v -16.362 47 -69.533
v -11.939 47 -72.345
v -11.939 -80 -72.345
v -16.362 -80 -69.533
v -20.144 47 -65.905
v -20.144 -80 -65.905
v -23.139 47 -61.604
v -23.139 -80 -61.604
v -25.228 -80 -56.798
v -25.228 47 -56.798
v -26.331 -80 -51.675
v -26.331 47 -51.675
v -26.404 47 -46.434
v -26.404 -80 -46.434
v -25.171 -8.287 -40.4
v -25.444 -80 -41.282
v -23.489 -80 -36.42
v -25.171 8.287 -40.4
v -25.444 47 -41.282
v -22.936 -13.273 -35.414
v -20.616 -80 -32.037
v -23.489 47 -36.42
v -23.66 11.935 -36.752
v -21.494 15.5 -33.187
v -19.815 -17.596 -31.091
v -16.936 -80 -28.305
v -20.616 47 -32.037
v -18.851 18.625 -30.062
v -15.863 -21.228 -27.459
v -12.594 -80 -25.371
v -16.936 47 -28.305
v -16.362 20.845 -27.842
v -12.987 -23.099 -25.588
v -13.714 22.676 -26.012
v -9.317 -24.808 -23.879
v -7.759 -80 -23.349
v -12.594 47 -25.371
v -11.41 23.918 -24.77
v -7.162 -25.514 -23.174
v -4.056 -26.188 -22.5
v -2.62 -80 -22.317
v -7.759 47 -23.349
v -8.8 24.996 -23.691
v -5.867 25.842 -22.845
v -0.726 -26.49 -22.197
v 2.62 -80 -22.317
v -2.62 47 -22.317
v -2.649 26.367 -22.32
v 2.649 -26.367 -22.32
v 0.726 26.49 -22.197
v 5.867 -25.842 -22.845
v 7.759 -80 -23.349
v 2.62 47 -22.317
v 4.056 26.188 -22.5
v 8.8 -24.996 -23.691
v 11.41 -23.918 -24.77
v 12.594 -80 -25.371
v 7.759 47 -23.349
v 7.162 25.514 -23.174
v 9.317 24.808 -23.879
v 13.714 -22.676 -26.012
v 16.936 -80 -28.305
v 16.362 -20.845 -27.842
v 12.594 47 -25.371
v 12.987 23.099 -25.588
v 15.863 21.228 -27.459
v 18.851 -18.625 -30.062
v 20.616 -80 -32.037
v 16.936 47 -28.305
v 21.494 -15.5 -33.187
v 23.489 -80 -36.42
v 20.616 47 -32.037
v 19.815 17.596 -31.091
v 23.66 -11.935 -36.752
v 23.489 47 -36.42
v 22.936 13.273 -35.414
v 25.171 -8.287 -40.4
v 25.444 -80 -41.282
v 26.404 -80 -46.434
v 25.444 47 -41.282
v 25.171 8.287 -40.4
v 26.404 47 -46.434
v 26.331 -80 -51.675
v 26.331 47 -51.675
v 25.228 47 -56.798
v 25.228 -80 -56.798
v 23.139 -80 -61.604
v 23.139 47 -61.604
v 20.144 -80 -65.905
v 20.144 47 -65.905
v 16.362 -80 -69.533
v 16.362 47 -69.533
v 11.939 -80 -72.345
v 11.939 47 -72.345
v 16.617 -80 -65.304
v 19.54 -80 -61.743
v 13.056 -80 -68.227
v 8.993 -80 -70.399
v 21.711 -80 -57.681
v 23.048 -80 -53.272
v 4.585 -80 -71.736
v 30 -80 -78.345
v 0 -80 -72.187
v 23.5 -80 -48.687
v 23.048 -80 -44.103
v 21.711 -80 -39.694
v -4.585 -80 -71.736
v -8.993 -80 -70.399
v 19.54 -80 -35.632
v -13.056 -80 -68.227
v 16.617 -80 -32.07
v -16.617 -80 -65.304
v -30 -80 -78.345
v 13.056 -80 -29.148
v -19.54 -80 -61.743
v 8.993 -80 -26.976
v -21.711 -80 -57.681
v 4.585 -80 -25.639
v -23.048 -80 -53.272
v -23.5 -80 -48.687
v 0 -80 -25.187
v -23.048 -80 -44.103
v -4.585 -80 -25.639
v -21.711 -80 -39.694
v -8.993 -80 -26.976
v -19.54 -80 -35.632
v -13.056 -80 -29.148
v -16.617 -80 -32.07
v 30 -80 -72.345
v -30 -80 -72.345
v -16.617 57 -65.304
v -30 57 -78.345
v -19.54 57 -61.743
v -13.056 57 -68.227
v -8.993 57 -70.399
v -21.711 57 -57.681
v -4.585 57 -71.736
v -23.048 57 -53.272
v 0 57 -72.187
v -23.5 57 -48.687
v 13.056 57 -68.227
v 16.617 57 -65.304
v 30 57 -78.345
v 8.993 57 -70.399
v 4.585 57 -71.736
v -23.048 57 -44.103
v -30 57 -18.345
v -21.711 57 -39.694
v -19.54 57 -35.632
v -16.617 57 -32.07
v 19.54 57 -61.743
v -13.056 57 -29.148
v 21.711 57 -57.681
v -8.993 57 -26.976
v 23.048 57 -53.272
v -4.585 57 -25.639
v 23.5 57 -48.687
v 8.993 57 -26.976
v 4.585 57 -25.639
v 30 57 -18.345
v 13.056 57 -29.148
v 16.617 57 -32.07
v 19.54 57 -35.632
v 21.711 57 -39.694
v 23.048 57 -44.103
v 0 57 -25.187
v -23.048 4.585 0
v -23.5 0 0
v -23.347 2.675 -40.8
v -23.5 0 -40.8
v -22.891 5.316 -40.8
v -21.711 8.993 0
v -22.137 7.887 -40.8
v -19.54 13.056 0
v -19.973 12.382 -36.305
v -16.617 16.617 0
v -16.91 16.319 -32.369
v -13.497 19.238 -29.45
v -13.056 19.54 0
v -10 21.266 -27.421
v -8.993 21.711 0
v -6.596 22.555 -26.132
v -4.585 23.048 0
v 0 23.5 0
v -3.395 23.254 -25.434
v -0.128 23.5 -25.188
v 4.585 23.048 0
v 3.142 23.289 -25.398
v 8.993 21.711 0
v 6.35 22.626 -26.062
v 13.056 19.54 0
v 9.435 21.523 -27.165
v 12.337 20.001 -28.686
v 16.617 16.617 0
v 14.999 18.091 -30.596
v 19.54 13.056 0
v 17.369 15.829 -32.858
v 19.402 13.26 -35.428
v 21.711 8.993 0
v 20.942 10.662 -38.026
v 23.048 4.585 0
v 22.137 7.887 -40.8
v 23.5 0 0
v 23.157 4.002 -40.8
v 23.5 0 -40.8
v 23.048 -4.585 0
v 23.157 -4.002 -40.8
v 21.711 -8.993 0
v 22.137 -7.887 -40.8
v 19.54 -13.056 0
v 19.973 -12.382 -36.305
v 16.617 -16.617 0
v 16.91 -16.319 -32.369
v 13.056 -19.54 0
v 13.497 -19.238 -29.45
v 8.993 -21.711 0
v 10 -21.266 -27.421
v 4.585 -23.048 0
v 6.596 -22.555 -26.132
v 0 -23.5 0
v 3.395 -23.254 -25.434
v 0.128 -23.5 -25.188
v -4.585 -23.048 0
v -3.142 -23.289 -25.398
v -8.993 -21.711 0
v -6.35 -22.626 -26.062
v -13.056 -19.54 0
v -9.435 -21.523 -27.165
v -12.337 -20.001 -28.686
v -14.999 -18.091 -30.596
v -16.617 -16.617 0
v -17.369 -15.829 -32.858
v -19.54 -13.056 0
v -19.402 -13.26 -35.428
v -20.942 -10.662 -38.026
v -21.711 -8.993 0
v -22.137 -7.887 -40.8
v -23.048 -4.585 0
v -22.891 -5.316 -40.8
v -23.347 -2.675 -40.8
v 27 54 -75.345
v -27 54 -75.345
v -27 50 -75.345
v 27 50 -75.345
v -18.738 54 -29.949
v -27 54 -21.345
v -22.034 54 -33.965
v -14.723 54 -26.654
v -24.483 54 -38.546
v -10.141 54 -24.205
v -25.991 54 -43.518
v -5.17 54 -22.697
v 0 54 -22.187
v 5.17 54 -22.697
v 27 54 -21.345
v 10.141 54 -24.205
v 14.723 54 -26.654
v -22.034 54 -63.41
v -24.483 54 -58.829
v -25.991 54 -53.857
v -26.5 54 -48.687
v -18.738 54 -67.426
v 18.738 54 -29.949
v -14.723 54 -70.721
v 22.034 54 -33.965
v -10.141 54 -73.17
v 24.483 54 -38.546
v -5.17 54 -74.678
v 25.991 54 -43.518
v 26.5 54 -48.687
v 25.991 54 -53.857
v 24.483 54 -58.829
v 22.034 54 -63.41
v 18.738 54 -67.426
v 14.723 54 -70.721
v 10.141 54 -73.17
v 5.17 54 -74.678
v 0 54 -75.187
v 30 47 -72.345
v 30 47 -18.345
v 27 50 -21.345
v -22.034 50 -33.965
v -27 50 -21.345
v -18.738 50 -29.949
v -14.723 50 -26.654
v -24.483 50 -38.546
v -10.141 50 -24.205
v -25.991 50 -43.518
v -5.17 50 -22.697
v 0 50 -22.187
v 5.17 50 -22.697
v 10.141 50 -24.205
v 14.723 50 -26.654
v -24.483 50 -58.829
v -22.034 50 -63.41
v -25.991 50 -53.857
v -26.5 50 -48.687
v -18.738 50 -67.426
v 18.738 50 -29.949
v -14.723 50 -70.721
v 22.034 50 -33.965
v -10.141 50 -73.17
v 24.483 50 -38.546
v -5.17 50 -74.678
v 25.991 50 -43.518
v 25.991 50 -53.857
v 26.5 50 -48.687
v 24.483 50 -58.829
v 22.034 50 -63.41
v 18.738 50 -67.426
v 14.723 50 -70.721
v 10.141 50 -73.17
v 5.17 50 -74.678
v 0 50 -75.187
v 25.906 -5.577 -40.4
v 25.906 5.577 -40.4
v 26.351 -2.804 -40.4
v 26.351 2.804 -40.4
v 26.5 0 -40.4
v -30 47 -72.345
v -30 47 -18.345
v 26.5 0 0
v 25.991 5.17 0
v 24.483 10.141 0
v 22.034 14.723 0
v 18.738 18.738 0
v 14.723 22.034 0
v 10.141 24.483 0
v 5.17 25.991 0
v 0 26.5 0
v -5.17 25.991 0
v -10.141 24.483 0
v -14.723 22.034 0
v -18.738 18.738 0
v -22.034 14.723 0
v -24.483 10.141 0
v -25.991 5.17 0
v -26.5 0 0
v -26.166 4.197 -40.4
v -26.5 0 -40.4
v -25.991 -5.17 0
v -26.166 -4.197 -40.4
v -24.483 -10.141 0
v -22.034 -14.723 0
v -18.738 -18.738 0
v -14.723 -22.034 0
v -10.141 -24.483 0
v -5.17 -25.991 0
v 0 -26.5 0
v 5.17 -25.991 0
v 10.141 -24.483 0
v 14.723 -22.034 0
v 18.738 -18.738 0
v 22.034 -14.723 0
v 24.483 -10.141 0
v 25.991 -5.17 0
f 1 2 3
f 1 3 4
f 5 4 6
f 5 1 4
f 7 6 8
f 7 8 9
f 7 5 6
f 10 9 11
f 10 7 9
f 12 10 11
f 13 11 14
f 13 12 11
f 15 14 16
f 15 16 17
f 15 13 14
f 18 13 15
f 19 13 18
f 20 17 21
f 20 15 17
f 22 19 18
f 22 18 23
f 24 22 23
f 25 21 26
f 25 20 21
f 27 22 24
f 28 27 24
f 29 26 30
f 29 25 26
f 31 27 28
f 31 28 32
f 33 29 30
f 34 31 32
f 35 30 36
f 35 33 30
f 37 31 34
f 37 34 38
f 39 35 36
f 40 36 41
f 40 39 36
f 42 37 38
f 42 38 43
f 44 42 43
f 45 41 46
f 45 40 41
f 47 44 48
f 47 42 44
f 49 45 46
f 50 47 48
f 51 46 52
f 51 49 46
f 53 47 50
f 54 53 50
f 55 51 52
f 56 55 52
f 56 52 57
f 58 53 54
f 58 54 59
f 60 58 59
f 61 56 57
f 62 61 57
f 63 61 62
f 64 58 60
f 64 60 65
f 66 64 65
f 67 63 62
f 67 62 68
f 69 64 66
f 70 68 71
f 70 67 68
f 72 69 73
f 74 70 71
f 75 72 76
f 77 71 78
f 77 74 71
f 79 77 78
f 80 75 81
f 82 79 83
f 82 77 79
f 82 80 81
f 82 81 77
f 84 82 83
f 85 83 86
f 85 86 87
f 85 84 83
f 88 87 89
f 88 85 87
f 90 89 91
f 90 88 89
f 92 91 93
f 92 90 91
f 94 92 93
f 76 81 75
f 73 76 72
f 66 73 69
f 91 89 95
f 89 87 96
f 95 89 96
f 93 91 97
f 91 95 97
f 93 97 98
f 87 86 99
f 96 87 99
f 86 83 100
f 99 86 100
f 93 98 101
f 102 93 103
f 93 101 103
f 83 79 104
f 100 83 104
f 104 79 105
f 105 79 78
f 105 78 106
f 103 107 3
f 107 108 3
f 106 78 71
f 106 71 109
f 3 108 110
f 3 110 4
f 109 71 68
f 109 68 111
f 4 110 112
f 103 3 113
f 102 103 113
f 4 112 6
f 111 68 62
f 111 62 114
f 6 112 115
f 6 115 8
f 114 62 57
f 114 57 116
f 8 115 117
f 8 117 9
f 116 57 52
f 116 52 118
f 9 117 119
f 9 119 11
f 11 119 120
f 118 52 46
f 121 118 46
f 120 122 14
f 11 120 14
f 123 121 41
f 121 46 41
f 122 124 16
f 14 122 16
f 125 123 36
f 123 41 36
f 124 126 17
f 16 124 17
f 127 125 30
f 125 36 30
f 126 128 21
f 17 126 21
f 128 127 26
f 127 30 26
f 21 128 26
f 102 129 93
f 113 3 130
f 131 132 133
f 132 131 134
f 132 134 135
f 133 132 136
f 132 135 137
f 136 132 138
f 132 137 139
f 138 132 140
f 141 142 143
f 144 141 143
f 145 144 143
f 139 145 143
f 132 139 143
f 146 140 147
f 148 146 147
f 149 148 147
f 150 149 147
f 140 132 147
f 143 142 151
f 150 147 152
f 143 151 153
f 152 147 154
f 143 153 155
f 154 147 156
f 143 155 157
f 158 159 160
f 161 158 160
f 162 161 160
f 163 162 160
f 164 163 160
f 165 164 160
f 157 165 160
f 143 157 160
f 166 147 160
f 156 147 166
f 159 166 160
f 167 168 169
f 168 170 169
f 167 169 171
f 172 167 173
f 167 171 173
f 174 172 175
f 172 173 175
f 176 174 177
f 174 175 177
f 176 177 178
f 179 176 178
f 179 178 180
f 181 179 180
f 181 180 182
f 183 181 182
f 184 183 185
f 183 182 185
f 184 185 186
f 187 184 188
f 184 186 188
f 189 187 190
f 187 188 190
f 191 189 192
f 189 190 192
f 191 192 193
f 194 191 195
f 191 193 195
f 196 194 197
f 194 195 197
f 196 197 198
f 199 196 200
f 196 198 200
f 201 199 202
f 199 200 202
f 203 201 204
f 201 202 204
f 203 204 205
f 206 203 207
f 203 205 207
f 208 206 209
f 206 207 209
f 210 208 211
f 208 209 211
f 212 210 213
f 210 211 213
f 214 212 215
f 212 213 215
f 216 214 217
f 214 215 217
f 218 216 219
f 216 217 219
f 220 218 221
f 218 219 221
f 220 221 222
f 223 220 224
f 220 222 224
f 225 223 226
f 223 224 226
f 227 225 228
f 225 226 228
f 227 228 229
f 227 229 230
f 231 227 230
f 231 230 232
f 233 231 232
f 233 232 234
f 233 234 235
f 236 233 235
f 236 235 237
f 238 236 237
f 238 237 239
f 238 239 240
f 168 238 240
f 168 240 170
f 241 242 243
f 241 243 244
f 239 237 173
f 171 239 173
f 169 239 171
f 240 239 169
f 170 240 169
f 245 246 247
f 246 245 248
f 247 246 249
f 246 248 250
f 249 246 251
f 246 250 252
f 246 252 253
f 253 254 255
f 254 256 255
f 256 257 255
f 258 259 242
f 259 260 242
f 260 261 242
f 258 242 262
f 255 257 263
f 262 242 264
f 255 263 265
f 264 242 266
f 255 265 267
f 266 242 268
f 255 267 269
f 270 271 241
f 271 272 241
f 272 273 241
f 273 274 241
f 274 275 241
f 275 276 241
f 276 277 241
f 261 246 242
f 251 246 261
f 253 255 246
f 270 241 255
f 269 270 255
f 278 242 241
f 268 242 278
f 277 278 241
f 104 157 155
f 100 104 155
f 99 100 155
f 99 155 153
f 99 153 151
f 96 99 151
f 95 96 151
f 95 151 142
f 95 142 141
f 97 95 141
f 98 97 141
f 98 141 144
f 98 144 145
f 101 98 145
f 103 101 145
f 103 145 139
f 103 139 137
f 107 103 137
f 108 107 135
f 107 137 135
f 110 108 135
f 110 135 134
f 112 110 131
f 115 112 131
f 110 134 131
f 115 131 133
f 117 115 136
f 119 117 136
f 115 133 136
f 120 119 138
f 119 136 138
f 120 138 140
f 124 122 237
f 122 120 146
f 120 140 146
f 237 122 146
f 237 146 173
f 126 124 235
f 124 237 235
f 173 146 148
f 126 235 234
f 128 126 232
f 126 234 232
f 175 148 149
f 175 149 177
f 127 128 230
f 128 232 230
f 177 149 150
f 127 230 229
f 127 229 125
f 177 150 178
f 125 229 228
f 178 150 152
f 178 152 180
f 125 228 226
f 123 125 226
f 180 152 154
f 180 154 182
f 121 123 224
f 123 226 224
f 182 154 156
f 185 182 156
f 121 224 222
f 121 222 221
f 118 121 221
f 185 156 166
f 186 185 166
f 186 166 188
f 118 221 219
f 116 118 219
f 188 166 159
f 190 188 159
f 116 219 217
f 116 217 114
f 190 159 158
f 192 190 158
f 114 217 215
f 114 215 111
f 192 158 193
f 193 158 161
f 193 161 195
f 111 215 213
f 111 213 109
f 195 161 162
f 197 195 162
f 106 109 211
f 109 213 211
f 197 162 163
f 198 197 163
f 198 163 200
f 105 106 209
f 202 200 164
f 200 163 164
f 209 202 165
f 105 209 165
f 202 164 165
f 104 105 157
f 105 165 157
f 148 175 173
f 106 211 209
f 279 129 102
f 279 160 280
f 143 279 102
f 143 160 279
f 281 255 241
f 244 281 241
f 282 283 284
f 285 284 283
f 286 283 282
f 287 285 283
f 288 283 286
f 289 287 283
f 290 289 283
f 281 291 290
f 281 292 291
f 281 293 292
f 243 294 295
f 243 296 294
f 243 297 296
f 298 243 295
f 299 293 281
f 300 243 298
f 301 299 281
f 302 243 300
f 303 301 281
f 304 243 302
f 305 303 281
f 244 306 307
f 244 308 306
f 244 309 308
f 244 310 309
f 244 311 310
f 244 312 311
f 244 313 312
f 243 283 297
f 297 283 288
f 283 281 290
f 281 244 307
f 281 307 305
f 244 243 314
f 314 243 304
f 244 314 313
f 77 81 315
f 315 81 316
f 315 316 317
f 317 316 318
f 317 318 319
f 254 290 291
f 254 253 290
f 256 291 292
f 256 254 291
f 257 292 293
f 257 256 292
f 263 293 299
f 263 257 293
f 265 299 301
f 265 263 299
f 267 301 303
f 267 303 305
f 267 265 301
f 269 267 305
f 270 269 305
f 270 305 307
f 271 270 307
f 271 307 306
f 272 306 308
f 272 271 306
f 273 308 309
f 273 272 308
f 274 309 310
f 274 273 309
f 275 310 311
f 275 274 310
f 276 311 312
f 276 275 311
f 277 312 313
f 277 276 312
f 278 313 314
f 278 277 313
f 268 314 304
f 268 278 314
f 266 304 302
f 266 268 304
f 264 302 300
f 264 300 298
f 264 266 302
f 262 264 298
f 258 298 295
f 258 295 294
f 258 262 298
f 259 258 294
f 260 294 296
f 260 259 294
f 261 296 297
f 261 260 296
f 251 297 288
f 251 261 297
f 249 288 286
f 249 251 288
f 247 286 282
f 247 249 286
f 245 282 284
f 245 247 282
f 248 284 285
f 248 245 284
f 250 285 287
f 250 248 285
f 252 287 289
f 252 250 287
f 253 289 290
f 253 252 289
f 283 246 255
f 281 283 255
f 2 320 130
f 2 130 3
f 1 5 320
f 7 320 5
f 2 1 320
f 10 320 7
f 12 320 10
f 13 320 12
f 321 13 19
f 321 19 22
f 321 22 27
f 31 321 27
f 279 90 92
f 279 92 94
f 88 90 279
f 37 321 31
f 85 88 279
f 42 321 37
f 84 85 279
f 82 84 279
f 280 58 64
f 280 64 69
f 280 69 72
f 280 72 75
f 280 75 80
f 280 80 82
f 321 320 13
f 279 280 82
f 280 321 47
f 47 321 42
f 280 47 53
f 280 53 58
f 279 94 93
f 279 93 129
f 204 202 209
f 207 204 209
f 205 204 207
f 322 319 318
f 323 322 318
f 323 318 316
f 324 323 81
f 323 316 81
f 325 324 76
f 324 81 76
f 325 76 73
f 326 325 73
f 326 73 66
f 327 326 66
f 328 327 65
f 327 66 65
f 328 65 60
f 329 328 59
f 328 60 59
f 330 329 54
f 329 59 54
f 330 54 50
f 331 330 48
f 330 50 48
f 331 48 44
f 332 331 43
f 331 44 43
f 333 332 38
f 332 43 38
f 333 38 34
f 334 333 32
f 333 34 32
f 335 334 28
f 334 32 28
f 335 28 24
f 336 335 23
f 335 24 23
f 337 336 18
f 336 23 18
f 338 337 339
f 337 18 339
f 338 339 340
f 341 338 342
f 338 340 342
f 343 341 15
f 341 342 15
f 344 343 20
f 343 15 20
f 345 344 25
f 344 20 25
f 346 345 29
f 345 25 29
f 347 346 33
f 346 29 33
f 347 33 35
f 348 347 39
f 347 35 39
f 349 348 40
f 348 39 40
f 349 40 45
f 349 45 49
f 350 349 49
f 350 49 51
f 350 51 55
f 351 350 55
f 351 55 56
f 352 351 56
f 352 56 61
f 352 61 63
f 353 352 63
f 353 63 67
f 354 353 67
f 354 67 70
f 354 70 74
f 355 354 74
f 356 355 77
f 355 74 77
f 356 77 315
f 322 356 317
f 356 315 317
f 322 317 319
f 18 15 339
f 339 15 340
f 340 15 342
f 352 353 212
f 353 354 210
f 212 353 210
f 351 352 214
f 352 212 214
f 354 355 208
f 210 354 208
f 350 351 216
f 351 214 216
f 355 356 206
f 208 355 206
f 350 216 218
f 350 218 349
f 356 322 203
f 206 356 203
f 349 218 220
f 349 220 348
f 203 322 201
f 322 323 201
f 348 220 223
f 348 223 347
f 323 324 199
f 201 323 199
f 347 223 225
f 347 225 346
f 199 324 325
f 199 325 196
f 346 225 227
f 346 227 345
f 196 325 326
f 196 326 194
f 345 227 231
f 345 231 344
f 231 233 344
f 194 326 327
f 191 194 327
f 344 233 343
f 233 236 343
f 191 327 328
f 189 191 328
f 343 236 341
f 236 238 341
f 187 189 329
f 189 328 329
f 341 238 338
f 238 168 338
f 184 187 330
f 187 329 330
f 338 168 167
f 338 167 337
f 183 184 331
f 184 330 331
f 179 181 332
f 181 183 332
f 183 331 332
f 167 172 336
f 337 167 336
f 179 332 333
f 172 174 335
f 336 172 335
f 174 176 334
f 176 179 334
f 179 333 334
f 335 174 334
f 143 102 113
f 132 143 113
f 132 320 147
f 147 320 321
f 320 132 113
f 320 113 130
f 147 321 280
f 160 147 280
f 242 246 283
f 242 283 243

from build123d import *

# Parameters (mm, degrees)
SKETCH1_W                 = 60
SKETCH1_H                 = 60
BOSS_EXTRUDE1_DEPTH       = 10
BOSS_EXTRUDE2_DEPTH       = 127
SKETCH3_W                 = 54
SKETCH3_H                 = 54
CUT_EXTRUDE1_DEPTH        = 4
SKETCH4_W                 = 26.5
SKETCH4_H                 = 4
SKETCH5_W                 = 26.5
SKETCH5_H                 = 40.4
M42_CLEARANCE_HOLE1_D     = 47
M42_CLEARANCE_HOLE1_DEPTH = 40.8
M42_CLEARANCE_HOLE2_D     = 47


with BuildPart() as part:
    # Sketch1 → Boss-Extrude1 (new body)
    with BuildSketch(Plane.XZ.offset(-47)):
        with Locations((0, -48.345395625)):
            Rectangle(SKETCH1_W, SKETCH1_H)
    extrude(amount=-BOSS_EXTRUDE1_DEPTH)

    # Sketch2 → Boss-Extrude2 (add)
    with BuildSketch(Plane.XZ.offset(-47)):
        with BuildLine():
            Line((11.939490511, -72.345395625), (30, -72.345395625))
            Line((30, -72.345395625), (30, -78.345395625))
            Line((30, -78.345395625), (-30, -78.345395625))
            Line((-30, -78.345395625), (-30, -72.345395625))
            Line((-30, -72.345395625), (-11.939490511, -72.345395625))
            ThreePointArc((-11.939490511, -72.345395625), (0, -22.187446298), (11.939490511, -72.345395625))
        make_face()
    extrude(amount=BOSS_EXTRUDE2_DEPTH)

    # Sketch3 → Cut-Extrude1 (cut)
    with BuildSketch(Plane(origin=(0, 54, 0), x_dir=(1, 0, 0), z_dir=(0, 1, 0))):
        with Locations((0, 48.345395625)):
            Rectangle(SKETCH3_W, SKETCH3_H)
    extrude(amount=-CUT_EXTRUDE1_DEPTH, mode=Mode.SUBTRACT)

    # Sketch4 → Revolve1 (revolve)
    with BuildSketch(Plane(origin=(0, 0, -48.687446298), x_dir=(-1, 0, 0), z_dir=(0, 0, -1)), mode=Mode.PRIVATE) as revolve1_sk:
        with Locations((-13.25, 52)):
            Rectangle(SKETCH4_W, SKETCH4_H)
    revolve(revolve1_sk.sketch.rotate(Axis((0, 50, -48.687446298), (0, 1, 0)), 270), axis=Axis((0, 50, -48.687446298), (0, 1, 0)))

    # Sketch5 → Revolve2 (revolve)
    with BuildSketch(Plane(origin=(0, 0, 0), x_dir=(1, 0, 0), z_dir=(0, 1, 0))):
        with Locations((13.25, 20.2)):
            Rectangle(SKETCH5_W, SKETCH5_H)
    revolve(axis=Axis((0, 0, -40.4), (0, 0, 1)))

    # M42 Clearance Hole1
    with Locations(Plane.XY):
        with Locations((0, 0)):
            Hole(M42_CLEARANCE_HOLE1_D / 2, depth=M42_CLEARANCE_HOLE1_DEPTH)

    # M42 Clearance Hole2 (through all)
    with Locations(Plane(origin=(0, -80, 0), x_dir=(-1, 0, 0), z_dir=(0, -1, 0))):
        with Locations((0, 48.687446298)):
            Hole(M42_CLEARANCE_HOLE2_D / 2)


solid = part.part
